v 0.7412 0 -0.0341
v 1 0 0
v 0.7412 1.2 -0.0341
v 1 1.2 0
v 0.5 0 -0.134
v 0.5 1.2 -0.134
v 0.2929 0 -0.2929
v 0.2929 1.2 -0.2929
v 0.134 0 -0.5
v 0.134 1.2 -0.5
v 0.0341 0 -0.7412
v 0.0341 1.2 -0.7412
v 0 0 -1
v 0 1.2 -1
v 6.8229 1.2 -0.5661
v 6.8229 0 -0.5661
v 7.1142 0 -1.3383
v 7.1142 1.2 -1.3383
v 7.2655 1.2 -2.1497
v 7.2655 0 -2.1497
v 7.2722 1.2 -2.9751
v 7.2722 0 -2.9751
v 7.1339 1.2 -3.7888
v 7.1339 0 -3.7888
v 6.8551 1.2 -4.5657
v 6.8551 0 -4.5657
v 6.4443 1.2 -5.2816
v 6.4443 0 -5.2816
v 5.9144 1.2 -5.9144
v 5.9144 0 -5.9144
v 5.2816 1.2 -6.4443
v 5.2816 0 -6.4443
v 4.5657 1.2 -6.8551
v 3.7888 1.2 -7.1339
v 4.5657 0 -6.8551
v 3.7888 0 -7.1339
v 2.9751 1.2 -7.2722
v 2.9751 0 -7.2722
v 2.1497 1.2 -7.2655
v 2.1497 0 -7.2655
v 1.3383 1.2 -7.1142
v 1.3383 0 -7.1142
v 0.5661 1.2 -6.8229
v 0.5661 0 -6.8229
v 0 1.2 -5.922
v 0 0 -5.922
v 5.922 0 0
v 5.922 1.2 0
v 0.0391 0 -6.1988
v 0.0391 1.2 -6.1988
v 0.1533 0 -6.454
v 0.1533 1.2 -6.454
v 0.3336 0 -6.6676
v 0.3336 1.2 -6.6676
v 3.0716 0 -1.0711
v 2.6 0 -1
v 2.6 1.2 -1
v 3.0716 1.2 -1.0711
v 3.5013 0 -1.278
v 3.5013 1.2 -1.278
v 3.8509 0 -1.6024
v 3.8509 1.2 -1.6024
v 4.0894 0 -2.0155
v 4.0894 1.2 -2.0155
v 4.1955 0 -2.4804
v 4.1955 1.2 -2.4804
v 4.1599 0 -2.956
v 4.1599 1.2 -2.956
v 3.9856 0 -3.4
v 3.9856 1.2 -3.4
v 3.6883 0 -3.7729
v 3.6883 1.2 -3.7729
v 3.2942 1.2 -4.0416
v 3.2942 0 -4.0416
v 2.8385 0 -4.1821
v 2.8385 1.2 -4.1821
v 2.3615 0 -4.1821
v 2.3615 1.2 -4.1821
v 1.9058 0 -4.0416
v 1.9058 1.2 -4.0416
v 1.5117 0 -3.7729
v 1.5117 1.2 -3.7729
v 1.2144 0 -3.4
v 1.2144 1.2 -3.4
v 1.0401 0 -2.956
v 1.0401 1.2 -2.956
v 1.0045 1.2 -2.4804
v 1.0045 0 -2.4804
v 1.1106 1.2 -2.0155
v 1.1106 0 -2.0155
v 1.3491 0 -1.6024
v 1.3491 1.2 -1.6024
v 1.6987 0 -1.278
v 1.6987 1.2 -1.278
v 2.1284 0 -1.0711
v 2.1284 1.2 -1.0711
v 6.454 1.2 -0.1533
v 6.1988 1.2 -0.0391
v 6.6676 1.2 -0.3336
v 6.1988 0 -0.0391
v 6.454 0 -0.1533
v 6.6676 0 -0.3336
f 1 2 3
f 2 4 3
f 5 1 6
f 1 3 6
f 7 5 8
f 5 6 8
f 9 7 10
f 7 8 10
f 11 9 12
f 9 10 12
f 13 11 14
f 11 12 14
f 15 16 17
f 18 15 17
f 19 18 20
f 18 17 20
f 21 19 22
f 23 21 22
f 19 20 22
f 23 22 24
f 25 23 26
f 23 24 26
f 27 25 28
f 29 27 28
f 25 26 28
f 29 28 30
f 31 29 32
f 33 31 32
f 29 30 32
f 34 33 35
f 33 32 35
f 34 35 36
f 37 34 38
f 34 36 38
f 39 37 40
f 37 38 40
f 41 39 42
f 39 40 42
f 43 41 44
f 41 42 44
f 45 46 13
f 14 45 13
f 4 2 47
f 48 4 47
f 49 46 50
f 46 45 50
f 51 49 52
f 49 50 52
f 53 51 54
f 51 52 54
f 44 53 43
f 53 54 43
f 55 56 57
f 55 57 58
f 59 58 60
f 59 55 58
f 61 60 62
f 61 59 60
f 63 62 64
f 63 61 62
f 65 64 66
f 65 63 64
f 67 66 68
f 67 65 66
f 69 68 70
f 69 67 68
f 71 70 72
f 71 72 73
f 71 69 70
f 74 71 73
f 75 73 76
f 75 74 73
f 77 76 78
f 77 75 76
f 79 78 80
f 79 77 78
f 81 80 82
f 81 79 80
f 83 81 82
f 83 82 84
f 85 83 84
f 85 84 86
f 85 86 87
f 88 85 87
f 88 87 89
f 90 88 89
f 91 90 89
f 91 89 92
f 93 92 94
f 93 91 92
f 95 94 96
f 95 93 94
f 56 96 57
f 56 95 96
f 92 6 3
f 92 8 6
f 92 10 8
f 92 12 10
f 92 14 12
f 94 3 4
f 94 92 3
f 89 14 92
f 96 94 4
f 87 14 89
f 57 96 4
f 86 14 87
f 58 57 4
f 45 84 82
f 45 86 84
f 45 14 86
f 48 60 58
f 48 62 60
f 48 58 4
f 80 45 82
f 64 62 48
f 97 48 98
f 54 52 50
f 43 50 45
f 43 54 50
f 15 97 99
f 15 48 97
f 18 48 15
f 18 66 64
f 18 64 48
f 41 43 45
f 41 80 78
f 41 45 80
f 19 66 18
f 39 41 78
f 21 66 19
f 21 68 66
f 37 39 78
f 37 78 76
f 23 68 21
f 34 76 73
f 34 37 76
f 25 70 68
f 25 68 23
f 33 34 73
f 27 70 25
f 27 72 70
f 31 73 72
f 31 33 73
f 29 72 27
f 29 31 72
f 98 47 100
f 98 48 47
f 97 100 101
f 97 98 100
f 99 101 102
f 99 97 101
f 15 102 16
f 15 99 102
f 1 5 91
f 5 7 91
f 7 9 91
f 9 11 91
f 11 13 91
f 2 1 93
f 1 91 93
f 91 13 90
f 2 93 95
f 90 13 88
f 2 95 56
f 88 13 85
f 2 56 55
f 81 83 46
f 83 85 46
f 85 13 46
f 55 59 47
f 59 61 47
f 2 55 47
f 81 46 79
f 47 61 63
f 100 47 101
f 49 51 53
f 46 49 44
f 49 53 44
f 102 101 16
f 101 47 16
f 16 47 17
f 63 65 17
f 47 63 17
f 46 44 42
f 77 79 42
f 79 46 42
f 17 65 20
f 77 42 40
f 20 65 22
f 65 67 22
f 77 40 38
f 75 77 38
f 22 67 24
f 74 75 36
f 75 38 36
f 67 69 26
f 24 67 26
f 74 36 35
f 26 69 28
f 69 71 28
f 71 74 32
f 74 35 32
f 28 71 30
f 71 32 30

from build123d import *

# Parameters (mm, degrees)
SKETCH1_R           = 1.6
BOSS_EXTRUDE1_DEPTH = 1.2
FILLET1_R           = 1


with BuildPart() as part:
    # Sketch1 → Boss-Extrude1 (new body)
    with BuildSketch(Plane(origin=(0, 0, 0), x_dir=(1, 0, 0), z_dir=(0, 1, 0))):
        with BuildLine():
            Line((0, 0), (6.5, 0))
            ThreePointArc((6.5, 0), (5.914362684, 5.914362684), (0, 6.5))
            Line((0, 6.5), (0, 0))
        make_face()
        with Locations(Location((2.6, 2.6, 0), (0, 0, 270))):
            Circle(SKETCH1_R, mode=Mode.SUBTRACT)
    extrude(amount=BOSS_EXTRUDE1_DEPTH)

    # Fillet1
    fillet1_edges = [part.edges().sort_by_distance(p)[0] for p in [
        (0, 0.6, -6.5),
        (6.5, 0.6, 0),
        (0, 0.6, 0),
    ]]
    fillet(fillet1_edges, radius=FILLET1_R)


solid = part.part
